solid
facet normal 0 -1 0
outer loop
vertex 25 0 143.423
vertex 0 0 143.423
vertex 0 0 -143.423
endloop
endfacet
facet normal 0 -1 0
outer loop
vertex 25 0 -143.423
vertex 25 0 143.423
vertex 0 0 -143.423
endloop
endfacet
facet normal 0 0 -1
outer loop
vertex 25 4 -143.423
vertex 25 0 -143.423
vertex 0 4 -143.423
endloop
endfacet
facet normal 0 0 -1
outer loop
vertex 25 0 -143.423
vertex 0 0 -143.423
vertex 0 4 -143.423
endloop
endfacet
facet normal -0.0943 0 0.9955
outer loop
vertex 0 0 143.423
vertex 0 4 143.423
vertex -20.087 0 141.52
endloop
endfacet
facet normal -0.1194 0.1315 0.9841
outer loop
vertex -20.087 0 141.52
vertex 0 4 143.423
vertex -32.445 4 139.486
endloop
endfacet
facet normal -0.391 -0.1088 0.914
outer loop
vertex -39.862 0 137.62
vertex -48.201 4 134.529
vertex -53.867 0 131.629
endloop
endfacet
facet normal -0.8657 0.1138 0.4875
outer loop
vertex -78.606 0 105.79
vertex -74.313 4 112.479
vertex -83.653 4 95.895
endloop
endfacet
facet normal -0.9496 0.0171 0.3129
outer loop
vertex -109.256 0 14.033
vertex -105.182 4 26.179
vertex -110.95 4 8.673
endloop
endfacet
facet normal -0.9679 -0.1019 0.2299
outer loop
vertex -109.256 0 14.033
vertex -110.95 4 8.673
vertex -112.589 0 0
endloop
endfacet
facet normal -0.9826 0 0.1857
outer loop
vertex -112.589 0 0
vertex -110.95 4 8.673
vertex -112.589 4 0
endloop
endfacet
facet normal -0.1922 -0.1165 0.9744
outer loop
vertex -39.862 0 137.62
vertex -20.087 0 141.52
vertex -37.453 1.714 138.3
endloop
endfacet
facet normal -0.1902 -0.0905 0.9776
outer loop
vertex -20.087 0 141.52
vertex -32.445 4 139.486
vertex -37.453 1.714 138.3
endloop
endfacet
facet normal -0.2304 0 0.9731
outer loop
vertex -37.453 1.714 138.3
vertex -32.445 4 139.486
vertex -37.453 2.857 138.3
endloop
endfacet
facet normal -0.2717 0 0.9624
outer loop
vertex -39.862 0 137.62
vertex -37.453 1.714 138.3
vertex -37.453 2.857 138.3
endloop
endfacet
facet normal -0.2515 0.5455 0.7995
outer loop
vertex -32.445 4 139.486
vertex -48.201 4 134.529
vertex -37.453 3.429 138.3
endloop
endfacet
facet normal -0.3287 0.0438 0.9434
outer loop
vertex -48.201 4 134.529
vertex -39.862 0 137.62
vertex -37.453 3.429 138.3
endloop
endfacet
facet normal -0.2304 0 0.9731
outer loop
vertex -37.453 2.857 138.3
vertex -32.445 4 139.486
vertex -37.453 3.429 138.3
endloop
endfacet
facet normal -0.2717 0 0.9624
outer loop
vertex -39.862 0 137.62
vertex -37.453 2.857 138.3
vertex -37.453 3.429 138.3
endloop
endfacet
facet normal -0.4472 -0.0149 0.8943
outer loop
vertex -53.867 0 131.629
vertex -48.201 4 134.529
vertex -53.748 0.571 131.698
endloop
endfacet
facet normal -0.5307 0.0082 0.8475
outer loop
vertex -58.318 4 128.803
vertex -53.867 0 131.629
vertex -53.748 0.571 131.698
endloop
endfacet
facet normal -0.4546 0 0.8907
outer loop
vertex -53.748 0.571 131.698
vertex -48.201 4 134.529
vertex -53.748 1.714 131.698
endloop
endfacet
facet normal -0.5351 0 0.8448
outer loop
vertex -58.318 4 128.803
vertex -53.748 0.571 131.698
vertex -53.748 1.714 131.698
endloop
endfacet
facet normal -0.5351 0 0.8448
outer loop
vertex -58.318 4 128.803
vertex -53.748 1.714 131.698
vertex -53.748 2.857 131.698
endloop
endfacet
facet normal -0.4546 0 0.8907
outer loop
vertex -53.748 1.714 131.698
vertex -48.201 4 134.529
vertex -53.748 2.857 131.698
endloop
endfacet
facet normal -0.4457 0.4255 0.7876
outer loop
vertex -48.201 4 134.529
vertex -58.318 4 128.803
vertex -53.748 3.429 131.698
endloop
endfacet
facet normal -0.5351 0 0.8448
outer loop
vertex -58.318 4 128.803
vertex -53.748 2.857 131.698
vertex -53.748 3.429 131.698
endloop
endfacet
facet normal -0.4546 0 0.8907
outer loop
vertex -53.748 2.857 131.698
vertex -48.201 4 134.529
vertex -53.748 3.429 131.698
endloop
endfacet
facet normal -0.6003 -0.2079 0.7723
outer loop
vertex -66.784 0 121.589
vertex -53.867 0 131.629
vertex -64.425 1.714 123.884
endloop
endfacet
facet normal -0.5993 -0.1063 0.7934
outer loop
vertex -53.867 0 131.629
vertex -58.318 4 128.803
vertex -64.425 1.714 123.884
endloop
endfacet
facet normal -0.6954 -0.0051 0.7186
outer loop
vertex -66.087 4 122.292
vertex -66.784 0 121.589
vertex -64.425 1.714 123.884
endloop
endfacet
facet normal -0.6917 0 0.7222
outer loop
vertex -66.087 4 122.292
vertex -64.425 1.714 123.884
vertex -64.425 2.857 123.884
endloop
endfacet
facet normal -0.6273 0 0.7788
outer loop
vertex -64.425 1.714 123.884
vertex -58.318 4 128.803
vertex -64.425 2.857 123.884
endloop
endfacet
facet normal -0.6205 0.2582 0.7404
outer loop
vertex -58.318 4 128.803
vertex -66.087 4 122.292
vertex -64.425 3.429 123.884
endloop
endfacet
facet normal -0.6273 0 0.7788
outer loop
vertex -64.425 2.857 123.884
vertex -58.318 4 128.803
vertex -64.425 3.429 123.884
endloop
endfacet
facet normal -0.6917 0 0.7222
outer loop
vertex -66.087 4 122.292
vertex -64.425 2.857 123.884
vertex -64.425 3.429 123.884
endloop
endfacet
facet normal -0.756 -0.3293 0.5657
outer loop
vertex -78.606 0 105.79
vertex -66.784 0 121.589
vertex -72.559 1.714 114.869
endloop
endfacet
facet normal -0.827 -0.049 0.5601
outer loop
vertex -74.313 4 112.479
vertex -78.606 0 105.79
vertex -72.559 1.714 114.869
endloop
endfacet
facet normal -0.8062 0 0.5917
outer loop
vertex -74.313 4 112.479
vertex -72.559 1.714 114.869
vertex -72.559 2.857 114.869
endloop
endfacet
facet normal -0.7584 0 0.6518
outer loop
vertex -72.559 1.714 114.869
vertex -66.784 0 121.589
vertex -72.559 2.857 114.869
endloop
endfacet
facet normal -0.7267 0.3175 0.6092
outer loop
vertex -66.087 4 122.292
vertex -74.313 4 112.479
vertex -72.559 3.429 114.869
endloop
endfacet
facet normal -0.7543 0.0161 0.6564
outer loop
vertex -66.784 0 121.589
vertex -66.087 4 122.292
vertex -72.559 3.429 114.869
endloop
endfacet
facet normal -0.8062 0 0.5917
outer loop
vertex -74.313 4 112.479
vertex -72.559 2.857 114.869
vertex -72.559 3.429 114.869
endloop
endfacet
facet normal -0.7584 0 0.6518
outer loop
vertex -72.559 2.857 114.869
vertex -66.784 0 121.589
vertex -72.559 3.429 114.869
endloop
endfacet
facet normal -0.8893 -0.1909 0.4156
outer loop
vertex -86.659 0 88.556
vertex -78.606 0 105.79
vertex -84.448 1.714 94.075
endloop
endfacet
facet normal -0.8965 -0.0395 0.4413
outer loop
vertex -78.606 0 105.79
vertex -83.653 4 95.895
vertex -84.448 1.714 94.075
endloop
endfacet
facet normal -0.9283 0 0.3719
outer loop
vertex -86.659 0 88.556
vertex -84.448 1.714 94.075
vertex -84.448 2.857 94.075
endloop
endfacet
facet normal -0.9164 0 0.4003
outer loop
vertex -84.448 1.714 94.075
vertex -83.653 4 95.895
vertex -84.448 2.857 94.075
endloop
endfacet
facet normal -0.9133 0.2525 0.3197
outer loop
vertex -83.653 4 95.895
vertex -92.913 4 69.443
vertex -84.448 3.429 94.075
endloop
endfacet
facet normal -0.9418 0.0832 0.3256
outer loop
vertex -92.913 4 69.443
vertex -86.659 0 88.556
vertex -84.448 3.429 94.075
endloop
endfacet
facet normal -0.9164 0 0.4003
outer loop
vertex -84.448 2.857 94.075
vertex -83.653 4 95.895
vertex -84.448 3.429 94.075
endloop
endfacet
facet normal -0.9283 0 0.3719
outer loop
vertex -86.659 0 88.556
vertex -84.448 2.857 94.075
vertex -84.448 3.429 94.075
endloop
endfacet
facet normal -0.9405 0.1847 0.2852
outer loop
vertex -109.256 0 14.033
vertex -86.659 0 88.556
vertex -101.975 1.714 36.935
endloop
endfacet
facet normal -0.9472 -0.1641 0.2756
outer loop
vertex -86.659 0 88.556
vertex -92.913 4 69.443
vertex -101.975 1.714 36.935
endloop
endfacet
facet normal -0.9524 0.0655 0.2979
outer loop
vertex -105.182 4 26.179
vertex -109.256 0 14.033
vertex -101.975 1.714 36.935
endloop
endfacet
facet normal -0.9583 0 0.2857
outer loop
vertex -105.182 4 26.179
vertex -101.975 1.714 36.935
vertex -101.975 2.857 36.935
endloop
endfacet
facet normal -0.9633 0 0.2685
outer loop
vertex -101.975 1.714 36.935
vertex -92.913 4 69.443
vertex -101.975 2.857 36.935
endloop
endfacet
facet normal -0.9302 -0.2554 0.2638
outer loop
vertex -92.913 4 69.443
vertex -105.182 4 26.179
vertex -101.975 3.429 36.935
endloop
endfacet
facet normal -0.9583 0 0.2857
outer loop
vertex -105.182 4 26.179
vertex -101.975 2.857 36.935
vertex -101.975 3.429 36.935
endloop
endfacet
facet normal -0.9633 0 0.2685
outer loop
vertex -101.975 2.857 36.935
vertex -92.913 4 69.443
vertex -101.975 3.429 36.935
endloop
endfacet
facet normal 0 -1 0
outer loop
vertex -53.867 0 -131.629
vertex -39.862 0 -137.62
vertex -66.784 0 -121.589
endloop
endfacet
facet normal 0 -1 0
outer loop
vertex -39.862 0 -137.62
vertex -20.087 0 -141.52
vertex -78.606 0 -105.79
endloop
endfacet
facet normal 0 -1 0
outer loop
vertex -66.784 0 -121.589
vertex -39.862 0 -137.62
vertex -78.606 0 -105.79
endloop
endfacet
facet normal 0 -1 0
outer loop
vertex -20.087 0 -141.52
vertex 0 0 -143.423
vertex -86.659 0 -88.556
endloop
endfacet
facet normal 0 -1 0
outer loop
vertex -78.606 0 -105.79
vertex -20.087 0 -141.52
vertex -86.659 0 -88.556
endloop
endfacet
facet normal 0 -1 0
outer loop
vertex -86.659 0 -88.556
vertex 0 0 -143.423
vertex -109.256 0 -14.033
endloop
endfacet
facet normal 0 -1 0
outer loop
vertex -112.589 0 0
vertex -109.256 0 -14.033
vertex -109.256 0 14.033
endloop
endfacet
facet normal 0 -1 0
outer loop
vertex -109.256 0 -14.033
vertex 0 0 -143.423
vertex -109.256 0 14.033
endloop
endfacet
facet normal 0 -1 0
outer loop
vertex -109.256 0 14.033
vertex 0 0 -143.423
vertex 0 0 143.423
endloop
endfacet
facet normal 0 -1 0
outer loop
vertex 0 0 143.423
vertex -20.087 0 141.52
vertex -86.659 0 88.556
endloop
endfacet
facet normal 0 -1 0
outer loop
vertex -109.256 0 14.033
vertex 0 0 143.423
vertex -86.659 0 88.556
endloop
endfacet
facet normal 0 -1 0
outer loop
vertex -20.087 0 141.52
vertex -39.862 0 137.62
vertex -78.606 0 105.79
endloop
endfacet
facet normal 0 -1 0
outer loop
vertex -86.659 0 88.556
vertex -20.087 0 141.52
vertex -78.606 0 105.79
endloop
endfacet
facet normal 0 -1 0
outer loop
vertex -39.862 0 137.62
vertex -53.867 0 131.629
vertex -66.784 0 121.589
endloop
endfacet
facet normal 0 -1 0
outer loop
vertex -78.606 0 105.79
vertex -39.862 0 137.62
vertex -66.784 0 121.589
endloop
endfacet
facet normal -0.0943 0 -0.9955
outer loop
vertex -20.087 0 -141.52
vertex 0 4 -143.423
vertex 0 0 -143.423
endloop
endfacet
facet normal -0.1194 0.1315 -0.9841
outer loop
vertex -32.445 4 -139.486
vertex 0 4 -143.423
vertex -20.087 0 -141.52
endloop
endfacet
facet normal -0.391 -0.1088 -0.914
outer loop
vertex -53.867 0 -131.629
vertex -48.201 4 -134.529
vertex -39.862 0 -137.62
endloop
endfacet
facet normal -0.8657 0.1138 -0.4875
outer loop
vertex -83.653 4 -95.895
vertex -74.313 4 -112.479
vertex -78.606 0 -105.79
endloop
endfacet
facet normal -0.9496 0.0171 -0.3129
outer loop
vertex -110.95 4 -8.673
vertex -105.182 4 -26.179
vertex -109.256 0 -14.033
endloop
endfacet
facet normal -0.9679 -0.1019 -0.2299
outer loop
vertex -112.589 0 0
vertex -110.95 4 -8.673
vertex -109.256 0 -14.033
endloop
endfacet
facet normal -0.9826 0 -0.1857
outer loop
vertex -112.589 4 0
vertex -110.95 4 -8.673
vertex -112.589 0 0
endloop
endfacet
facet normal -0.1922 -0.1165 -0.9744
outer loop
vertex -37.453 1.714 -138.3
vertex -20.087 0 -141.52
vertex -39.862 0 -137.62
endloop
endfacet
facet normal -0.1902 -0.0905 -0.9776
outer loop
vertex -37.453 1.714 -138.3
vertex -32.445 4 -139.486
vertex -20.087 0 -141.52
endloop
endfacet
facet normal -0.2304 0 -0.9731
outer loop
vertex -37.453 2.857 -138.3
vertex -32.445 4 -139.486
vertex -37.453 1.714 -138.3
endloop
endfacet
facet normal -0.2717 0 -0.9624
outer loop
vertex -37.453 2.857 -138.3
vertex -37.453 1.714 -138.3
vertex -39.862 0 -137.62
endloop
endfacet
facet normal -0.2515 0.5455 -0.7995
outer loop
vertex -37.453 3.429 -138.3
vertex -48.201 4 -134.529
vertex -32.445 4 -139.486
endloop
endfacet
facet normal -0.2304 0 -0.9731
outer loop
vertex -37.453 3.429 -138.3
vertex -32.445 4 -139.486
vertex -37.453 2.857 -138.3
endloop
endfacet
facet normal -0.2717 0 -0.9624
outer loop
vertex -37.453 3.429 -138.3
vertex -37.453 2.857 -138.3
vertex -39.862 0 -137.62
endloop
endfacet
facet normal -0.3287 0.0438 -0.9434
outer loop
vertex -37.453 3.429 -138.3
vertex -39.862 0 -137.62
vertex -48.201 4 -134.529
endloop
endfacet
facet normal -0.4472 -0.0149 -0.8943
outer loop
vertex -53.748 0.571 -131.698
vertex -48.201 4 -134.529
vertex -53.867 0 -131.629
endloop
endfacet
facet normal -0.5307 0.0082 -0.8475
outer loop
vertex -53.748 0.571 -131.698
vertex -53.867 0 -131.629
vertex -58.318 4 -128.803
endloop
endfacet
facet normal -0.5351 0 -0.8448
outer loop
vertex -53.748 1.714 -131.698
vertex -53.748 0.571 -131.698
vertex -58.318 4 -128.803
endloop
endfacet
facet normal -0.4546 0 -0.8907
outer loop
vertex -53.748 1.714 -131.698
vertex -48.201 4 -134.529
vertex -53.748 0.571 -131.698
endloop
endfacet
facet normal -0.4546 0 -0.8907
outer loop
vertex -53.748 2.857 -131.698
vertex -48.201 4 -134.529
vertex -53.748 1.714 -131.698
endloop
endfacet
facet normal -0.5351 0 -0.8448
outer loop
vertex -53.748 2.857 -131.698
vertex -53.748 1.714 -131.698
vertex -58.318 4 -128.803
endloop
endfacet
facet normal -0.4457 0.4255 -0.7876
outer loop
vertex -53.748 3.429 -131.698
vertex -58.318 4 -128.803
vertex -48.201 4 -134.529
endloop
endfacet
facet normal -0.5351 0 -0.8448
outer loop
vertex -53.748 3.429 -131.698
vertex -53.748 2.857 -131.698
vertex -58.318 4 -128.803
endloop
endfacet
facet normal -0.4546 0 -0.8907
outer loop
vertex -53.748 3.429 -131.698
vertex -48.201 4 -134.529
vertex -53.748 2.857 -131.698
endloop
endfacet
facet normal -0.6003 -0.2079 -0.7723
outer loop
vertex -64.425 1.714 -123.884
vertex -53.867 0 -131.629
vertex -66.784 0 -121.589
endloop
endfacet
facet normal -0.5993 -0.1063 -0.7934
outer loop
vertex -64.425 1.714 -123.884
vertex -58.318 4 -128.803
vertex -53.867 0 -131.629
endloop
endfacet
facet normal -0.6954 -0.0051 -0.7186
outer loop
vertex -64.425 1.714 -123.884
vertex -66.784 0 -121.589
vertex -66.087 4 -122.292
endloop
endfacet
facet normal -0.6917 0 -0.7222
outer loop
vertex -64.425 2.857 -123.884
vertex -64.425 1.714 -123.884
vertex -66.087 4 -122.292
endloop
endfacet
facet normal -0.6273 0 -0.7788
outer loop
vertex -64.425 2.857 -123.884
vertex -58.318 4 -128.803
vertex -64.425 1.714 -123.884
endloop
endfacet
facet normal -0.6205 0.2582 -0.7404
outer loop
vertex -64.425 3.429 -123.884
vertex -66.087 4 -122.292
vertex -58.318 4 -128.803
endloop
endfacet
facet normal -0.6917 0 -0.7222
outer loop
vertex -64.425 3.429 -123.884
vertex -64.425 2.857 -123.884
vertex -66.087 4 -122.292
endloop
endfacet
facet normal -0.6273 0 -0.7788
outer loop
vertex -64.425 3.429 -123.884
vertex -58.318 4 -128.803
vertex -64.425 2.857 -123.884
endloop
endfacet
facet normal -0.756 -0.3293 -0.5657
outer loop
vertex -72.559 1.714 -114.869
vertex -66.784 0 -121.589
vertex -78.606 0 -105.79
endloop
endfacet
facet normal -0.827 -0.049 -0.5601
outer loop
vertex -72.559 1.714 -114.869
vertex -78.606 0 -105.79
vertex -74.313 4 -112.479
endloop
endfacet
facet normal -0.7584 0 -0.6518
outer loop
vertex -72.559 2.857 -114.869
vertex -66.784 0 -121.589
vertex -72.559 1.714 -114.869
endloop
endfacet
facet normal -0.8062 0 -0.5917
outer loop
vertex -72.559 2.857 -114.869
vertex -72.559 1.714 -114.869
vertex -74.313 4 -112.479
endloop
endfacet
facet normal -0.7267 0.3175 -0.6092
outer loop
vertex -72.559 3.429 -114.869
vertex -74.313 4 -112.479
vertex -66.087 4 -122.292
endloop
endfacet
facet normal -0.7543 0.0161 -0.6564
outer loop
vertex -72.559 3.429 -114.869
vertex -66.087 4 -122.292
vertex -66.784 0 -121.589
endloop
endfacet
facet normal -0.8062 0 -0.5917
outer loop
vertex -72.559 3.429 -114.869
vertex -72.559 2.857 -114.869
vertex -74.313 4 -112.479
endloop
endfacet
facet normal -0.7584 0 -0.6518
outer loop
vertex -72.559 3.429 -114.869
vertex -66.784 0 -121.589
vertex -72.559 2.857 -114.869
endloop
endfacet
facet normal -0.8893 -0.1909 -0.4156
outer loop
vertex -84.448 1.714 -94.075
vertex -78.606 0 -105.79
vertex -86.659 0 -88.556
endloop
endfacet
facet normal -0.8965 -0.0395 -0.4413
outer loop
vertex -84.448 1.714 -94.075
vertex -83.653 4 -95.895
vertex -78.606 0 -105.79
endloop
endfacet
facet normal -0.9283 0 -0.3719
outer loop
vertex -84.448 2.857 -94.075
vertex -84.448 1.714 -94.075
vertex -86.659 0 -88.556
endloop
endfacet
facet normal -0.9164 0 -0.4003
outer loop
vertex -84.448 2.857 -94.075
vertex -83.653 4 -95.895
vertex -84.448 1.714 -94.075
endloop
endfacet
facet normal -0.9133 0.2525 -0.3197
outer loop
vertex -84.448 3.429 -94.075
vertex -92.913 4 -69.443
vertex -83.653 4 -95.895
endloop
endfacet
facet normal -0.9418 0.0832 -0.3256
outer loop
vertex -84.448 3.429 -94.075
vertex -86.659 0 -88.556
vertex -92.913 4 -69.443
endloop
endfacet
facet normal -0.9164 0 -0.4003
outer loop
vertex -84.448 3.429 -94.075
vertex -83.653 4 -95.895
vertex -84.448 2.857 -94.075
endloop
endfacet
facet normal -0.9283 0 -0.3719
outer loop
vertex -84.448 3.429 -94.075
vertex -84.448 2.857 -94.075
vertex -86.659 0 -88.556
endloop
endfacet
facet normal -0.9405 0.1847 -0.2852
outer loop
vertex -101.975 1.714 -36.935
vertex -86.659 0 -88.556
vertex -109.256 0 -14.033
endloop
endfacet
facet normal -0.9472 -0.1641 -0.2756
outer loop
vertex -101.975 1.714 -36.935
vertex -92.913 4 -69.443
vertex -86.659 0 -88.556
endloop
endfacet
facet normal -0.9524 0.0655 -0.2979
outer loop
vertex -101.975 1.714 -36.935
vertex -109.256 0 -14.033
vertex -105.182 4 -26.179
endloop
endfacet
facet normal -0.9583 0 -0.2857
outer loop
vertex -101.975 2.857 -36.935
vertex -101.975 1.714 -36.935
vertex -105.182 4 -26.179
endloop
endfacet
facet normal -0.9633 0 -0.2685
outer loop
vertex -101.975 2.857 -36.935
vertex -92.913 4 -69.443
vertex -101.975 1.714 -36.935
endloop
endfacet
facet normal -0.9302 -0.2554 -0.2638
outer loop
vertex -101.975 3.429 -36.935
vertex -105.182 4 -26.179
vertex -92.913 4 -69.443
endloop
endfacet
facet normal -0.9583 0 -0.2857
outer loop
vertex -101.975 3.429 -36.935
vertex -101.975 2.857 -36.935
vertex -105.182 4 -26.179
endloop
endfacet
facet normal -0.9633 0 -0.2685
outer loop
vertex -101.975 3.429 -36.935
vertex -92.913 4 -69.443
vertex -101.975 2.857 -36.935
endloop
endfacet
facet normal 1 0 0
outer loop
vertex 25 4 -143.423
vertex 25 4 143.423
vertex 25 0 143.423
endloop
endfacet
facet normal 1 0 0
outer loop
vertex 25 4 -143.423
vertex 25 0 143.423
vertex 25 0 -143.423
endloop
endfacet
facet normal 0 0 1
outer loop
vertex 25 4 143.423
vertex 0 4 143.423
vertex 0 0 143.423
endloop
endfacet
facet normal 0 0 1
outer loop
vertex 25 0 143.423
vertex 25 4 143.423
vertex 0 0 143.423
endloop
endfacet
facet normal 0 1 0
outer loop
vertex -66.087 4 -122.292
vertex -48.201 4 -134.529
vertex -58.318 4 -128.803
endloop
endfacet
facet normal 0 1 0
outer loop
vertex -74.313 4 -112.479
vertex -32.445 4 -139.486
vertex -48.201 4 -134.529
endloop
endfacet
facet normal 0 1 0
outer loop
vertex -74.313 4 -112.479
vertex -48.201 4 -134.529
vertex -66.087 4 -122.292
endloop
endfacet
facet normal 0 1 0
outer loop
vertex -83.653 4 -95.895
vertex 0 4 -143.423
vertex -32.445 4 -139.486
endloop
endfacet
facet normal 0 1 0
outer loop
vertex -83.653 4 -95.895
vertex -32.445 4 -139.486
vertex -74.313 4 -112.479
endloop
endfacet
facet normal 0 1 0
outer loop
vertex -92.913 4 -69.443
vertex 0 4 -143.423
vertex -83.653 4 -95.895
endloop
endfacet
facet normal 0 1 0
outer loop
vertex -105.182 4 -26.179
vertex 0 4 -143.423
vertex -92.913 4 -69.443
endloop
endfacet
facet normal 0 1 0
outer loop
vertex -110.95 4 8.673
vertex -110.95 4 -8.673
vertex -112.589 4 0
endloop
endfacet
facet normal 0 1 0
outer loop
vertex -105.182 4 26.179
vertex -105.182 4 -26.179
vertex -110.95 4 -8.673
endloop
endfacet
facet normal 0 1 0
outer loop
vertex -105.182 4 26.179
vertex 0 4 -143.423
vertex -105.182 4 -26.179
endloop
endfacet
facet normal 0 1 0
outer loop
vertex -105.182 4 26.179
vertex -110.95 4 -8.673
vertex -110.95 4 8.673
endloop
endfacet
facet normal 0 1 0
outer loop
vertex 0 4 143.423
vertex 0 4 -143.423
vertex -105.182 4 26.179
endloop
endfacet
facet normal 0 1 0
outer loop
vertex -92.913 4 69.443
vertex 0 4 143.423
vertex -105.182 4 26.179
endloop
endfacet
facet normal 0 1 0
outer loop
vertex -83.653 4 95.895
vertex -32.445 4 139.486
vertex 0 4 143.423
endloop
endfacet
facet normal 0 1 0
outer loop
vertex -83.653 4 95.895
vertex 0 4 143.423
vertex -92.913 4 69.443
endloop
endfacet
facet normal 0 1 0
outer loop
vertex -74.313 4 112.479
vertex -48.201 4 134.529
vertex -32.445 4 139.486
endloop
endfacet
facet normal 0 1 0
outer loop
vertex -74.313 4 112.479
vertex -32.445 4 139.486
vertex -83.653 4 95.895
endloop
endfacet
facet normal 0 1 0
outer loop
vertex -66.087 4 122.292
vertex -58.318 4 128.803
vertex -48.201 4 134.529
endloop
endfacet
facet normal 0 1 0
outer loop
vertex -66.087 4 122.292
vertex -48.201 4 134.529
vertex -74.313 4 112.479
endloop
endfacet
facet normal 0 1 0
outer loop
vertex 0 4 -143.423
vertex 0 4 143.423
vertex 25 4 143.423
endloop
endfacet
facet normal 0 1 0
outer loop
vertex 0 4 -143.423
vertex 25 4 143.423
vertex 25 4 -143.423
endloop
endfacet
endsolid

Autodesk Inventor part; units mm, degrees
ref_plane "YZ Plane" through (0, 0, 0) normal (1, 0, 0) x (0, 1, 0)
ref_plane "XZ Plane" through (0, 0, 0) normal (0, 1, 0) x (-1, 0, 0)
ref_plane "XY Plane" through (0, 0, 0) normal (0, 0, 1) x (1, 0, 0)
sketch "Эскиз1" plane through (0, 0, 0) normal (0, 1, 0) x (-1, 0, 0)
  circle A0 centre (0, 0) radius 165
  line L0 (0, 165) -> (0, -165)
  dimension "d0" = 330
extrude "Выдавливание1" add sketch "Эскиз1" along normal blind 4 contours A0 L0 picked at (44.4959, 32.3282)
sketch "Эскиз2" plane through (0, 4, 0) normal (0, 1, 0) x (1, 0, 0)
  line L0 (0, 0) -> (-113.4659, 0)
  line L1 (0, -165) -> (0, 165) projected
  line L2 (0, -143.423) -> (-29.4077, -141.3803) construction
  line L3 (-29.4077, -141.3803) -> (-49.9234, -135.6119) construction
  line L4 (-49.9234, -135.6119) -> (-65.9786, -125.0595) construction
  line L5 (-65.9786, -125.0595) -> (-80.1797, -105.2669) construction
  line L6 (-80.1797, -105.2669) -> (-89.1079, -84.139) construction
  line L7 (-89.1079, -84.139) -> (-98.5999, -49.2669) construction
  line L8 (-98.5999, -49.2669) -> (-105.5818, -23.0172) construction
  line L9 (-105.5818, -23.0172) -> (-110.6157, -11.1357) construction
  line L10 (-110.6157, -11.1357) -> (-112.257, -3.9988) construction
  line L11 (-112.257, -3.9988) -> (-112.5892, 0) construction
  spline S0 degree 4 poles (0, -143.423) (-29.4077, -141.3803) (-49.9234, -135.6119) (-65.9786, -125.0595) (-80.1797, -105.2669) (-89.1079, -84.139) (-98.5999, -49.2669) (-105.5818, -23.0172) (-110.6157, -11.1357) (-112.257, -3.9988) (-112.5892, 0) knots 1 1 1 1 1 2 3 4 5 6 7 8 8 8 8 8
  line L12 (0, 143.423) -> (-29.4077, 141.3803) construction
  line L13 (-29.4077, 141.3803) -> (-49.9234, 135.6119) construction
  line L14 (-49.9234, 135.6119) -> (-65.9786, 125.0595) construction
  line L15 (-65.9786, 125.0595) -> (-80.1797, 105.2669) construction
  line L16 (-80.1797, 105.2669) -> (-89.1079, 84.139) construction
  line L17 (-89.1079, 84.139) -> (-98.5999, 49.2669) construction
  line L18 (-98.5999, 49.2669) -> (-105.5818, 23.0172) construction
  line L19 (-105.5818, 23.0172) -> (-110.6157, 11.1357) construction
  line L20 (-110.6157, 11.1357) -> (-112.257, 3.9988) construction
  line L21 (-112.257, 3.9988) -> (-112.5892, 0) construction
  spline S1 degree 4 poles (0, 143.423) (-29.4077, 141.3803) (-49.9234, 135.6119) (-65.9786, 125.0595) (-80.1797, 105.2669) (-89.1079, 84.139) (-98.5999, 49.2669) (-105.5818, 23.0172) (-110.6157, 11.1357) (-112.257, 3.9988) (-112.5892, 0) knots 1 1 1 1 1 2 3 4 5 6 7 8 8 8 8 8
  arc A0 (0, 165) -> (0, -165) centre (0, 0) ccw projected
extrude "Выдавливание2" cut sketch "Эскиз2" against normal through all contours S0 L1 A0 S1
sketch "Эскиз3" plane through (0, 0, 143.423) normal (1, 0, 0) x (0, 0, -1)
  line L0 (0, 0) -> (286.8461, 0) projected
  line L1 (0, 4) -> (286.8461, 4) projected
  line L2 (0, 0) -> (286.8461, 0)
  line L3 (286.8461, 0) -> (286.8461, 4)
  line L4 (286.8461, 4) -> (0, 4)
  line L5 (0, 4) -> (0, 0)
  point P0 (143.423, 0)
extrude "Выдавливание3" add sketch "Эскиз3" along normal blind 25
properties part number "платформа_глаза"
